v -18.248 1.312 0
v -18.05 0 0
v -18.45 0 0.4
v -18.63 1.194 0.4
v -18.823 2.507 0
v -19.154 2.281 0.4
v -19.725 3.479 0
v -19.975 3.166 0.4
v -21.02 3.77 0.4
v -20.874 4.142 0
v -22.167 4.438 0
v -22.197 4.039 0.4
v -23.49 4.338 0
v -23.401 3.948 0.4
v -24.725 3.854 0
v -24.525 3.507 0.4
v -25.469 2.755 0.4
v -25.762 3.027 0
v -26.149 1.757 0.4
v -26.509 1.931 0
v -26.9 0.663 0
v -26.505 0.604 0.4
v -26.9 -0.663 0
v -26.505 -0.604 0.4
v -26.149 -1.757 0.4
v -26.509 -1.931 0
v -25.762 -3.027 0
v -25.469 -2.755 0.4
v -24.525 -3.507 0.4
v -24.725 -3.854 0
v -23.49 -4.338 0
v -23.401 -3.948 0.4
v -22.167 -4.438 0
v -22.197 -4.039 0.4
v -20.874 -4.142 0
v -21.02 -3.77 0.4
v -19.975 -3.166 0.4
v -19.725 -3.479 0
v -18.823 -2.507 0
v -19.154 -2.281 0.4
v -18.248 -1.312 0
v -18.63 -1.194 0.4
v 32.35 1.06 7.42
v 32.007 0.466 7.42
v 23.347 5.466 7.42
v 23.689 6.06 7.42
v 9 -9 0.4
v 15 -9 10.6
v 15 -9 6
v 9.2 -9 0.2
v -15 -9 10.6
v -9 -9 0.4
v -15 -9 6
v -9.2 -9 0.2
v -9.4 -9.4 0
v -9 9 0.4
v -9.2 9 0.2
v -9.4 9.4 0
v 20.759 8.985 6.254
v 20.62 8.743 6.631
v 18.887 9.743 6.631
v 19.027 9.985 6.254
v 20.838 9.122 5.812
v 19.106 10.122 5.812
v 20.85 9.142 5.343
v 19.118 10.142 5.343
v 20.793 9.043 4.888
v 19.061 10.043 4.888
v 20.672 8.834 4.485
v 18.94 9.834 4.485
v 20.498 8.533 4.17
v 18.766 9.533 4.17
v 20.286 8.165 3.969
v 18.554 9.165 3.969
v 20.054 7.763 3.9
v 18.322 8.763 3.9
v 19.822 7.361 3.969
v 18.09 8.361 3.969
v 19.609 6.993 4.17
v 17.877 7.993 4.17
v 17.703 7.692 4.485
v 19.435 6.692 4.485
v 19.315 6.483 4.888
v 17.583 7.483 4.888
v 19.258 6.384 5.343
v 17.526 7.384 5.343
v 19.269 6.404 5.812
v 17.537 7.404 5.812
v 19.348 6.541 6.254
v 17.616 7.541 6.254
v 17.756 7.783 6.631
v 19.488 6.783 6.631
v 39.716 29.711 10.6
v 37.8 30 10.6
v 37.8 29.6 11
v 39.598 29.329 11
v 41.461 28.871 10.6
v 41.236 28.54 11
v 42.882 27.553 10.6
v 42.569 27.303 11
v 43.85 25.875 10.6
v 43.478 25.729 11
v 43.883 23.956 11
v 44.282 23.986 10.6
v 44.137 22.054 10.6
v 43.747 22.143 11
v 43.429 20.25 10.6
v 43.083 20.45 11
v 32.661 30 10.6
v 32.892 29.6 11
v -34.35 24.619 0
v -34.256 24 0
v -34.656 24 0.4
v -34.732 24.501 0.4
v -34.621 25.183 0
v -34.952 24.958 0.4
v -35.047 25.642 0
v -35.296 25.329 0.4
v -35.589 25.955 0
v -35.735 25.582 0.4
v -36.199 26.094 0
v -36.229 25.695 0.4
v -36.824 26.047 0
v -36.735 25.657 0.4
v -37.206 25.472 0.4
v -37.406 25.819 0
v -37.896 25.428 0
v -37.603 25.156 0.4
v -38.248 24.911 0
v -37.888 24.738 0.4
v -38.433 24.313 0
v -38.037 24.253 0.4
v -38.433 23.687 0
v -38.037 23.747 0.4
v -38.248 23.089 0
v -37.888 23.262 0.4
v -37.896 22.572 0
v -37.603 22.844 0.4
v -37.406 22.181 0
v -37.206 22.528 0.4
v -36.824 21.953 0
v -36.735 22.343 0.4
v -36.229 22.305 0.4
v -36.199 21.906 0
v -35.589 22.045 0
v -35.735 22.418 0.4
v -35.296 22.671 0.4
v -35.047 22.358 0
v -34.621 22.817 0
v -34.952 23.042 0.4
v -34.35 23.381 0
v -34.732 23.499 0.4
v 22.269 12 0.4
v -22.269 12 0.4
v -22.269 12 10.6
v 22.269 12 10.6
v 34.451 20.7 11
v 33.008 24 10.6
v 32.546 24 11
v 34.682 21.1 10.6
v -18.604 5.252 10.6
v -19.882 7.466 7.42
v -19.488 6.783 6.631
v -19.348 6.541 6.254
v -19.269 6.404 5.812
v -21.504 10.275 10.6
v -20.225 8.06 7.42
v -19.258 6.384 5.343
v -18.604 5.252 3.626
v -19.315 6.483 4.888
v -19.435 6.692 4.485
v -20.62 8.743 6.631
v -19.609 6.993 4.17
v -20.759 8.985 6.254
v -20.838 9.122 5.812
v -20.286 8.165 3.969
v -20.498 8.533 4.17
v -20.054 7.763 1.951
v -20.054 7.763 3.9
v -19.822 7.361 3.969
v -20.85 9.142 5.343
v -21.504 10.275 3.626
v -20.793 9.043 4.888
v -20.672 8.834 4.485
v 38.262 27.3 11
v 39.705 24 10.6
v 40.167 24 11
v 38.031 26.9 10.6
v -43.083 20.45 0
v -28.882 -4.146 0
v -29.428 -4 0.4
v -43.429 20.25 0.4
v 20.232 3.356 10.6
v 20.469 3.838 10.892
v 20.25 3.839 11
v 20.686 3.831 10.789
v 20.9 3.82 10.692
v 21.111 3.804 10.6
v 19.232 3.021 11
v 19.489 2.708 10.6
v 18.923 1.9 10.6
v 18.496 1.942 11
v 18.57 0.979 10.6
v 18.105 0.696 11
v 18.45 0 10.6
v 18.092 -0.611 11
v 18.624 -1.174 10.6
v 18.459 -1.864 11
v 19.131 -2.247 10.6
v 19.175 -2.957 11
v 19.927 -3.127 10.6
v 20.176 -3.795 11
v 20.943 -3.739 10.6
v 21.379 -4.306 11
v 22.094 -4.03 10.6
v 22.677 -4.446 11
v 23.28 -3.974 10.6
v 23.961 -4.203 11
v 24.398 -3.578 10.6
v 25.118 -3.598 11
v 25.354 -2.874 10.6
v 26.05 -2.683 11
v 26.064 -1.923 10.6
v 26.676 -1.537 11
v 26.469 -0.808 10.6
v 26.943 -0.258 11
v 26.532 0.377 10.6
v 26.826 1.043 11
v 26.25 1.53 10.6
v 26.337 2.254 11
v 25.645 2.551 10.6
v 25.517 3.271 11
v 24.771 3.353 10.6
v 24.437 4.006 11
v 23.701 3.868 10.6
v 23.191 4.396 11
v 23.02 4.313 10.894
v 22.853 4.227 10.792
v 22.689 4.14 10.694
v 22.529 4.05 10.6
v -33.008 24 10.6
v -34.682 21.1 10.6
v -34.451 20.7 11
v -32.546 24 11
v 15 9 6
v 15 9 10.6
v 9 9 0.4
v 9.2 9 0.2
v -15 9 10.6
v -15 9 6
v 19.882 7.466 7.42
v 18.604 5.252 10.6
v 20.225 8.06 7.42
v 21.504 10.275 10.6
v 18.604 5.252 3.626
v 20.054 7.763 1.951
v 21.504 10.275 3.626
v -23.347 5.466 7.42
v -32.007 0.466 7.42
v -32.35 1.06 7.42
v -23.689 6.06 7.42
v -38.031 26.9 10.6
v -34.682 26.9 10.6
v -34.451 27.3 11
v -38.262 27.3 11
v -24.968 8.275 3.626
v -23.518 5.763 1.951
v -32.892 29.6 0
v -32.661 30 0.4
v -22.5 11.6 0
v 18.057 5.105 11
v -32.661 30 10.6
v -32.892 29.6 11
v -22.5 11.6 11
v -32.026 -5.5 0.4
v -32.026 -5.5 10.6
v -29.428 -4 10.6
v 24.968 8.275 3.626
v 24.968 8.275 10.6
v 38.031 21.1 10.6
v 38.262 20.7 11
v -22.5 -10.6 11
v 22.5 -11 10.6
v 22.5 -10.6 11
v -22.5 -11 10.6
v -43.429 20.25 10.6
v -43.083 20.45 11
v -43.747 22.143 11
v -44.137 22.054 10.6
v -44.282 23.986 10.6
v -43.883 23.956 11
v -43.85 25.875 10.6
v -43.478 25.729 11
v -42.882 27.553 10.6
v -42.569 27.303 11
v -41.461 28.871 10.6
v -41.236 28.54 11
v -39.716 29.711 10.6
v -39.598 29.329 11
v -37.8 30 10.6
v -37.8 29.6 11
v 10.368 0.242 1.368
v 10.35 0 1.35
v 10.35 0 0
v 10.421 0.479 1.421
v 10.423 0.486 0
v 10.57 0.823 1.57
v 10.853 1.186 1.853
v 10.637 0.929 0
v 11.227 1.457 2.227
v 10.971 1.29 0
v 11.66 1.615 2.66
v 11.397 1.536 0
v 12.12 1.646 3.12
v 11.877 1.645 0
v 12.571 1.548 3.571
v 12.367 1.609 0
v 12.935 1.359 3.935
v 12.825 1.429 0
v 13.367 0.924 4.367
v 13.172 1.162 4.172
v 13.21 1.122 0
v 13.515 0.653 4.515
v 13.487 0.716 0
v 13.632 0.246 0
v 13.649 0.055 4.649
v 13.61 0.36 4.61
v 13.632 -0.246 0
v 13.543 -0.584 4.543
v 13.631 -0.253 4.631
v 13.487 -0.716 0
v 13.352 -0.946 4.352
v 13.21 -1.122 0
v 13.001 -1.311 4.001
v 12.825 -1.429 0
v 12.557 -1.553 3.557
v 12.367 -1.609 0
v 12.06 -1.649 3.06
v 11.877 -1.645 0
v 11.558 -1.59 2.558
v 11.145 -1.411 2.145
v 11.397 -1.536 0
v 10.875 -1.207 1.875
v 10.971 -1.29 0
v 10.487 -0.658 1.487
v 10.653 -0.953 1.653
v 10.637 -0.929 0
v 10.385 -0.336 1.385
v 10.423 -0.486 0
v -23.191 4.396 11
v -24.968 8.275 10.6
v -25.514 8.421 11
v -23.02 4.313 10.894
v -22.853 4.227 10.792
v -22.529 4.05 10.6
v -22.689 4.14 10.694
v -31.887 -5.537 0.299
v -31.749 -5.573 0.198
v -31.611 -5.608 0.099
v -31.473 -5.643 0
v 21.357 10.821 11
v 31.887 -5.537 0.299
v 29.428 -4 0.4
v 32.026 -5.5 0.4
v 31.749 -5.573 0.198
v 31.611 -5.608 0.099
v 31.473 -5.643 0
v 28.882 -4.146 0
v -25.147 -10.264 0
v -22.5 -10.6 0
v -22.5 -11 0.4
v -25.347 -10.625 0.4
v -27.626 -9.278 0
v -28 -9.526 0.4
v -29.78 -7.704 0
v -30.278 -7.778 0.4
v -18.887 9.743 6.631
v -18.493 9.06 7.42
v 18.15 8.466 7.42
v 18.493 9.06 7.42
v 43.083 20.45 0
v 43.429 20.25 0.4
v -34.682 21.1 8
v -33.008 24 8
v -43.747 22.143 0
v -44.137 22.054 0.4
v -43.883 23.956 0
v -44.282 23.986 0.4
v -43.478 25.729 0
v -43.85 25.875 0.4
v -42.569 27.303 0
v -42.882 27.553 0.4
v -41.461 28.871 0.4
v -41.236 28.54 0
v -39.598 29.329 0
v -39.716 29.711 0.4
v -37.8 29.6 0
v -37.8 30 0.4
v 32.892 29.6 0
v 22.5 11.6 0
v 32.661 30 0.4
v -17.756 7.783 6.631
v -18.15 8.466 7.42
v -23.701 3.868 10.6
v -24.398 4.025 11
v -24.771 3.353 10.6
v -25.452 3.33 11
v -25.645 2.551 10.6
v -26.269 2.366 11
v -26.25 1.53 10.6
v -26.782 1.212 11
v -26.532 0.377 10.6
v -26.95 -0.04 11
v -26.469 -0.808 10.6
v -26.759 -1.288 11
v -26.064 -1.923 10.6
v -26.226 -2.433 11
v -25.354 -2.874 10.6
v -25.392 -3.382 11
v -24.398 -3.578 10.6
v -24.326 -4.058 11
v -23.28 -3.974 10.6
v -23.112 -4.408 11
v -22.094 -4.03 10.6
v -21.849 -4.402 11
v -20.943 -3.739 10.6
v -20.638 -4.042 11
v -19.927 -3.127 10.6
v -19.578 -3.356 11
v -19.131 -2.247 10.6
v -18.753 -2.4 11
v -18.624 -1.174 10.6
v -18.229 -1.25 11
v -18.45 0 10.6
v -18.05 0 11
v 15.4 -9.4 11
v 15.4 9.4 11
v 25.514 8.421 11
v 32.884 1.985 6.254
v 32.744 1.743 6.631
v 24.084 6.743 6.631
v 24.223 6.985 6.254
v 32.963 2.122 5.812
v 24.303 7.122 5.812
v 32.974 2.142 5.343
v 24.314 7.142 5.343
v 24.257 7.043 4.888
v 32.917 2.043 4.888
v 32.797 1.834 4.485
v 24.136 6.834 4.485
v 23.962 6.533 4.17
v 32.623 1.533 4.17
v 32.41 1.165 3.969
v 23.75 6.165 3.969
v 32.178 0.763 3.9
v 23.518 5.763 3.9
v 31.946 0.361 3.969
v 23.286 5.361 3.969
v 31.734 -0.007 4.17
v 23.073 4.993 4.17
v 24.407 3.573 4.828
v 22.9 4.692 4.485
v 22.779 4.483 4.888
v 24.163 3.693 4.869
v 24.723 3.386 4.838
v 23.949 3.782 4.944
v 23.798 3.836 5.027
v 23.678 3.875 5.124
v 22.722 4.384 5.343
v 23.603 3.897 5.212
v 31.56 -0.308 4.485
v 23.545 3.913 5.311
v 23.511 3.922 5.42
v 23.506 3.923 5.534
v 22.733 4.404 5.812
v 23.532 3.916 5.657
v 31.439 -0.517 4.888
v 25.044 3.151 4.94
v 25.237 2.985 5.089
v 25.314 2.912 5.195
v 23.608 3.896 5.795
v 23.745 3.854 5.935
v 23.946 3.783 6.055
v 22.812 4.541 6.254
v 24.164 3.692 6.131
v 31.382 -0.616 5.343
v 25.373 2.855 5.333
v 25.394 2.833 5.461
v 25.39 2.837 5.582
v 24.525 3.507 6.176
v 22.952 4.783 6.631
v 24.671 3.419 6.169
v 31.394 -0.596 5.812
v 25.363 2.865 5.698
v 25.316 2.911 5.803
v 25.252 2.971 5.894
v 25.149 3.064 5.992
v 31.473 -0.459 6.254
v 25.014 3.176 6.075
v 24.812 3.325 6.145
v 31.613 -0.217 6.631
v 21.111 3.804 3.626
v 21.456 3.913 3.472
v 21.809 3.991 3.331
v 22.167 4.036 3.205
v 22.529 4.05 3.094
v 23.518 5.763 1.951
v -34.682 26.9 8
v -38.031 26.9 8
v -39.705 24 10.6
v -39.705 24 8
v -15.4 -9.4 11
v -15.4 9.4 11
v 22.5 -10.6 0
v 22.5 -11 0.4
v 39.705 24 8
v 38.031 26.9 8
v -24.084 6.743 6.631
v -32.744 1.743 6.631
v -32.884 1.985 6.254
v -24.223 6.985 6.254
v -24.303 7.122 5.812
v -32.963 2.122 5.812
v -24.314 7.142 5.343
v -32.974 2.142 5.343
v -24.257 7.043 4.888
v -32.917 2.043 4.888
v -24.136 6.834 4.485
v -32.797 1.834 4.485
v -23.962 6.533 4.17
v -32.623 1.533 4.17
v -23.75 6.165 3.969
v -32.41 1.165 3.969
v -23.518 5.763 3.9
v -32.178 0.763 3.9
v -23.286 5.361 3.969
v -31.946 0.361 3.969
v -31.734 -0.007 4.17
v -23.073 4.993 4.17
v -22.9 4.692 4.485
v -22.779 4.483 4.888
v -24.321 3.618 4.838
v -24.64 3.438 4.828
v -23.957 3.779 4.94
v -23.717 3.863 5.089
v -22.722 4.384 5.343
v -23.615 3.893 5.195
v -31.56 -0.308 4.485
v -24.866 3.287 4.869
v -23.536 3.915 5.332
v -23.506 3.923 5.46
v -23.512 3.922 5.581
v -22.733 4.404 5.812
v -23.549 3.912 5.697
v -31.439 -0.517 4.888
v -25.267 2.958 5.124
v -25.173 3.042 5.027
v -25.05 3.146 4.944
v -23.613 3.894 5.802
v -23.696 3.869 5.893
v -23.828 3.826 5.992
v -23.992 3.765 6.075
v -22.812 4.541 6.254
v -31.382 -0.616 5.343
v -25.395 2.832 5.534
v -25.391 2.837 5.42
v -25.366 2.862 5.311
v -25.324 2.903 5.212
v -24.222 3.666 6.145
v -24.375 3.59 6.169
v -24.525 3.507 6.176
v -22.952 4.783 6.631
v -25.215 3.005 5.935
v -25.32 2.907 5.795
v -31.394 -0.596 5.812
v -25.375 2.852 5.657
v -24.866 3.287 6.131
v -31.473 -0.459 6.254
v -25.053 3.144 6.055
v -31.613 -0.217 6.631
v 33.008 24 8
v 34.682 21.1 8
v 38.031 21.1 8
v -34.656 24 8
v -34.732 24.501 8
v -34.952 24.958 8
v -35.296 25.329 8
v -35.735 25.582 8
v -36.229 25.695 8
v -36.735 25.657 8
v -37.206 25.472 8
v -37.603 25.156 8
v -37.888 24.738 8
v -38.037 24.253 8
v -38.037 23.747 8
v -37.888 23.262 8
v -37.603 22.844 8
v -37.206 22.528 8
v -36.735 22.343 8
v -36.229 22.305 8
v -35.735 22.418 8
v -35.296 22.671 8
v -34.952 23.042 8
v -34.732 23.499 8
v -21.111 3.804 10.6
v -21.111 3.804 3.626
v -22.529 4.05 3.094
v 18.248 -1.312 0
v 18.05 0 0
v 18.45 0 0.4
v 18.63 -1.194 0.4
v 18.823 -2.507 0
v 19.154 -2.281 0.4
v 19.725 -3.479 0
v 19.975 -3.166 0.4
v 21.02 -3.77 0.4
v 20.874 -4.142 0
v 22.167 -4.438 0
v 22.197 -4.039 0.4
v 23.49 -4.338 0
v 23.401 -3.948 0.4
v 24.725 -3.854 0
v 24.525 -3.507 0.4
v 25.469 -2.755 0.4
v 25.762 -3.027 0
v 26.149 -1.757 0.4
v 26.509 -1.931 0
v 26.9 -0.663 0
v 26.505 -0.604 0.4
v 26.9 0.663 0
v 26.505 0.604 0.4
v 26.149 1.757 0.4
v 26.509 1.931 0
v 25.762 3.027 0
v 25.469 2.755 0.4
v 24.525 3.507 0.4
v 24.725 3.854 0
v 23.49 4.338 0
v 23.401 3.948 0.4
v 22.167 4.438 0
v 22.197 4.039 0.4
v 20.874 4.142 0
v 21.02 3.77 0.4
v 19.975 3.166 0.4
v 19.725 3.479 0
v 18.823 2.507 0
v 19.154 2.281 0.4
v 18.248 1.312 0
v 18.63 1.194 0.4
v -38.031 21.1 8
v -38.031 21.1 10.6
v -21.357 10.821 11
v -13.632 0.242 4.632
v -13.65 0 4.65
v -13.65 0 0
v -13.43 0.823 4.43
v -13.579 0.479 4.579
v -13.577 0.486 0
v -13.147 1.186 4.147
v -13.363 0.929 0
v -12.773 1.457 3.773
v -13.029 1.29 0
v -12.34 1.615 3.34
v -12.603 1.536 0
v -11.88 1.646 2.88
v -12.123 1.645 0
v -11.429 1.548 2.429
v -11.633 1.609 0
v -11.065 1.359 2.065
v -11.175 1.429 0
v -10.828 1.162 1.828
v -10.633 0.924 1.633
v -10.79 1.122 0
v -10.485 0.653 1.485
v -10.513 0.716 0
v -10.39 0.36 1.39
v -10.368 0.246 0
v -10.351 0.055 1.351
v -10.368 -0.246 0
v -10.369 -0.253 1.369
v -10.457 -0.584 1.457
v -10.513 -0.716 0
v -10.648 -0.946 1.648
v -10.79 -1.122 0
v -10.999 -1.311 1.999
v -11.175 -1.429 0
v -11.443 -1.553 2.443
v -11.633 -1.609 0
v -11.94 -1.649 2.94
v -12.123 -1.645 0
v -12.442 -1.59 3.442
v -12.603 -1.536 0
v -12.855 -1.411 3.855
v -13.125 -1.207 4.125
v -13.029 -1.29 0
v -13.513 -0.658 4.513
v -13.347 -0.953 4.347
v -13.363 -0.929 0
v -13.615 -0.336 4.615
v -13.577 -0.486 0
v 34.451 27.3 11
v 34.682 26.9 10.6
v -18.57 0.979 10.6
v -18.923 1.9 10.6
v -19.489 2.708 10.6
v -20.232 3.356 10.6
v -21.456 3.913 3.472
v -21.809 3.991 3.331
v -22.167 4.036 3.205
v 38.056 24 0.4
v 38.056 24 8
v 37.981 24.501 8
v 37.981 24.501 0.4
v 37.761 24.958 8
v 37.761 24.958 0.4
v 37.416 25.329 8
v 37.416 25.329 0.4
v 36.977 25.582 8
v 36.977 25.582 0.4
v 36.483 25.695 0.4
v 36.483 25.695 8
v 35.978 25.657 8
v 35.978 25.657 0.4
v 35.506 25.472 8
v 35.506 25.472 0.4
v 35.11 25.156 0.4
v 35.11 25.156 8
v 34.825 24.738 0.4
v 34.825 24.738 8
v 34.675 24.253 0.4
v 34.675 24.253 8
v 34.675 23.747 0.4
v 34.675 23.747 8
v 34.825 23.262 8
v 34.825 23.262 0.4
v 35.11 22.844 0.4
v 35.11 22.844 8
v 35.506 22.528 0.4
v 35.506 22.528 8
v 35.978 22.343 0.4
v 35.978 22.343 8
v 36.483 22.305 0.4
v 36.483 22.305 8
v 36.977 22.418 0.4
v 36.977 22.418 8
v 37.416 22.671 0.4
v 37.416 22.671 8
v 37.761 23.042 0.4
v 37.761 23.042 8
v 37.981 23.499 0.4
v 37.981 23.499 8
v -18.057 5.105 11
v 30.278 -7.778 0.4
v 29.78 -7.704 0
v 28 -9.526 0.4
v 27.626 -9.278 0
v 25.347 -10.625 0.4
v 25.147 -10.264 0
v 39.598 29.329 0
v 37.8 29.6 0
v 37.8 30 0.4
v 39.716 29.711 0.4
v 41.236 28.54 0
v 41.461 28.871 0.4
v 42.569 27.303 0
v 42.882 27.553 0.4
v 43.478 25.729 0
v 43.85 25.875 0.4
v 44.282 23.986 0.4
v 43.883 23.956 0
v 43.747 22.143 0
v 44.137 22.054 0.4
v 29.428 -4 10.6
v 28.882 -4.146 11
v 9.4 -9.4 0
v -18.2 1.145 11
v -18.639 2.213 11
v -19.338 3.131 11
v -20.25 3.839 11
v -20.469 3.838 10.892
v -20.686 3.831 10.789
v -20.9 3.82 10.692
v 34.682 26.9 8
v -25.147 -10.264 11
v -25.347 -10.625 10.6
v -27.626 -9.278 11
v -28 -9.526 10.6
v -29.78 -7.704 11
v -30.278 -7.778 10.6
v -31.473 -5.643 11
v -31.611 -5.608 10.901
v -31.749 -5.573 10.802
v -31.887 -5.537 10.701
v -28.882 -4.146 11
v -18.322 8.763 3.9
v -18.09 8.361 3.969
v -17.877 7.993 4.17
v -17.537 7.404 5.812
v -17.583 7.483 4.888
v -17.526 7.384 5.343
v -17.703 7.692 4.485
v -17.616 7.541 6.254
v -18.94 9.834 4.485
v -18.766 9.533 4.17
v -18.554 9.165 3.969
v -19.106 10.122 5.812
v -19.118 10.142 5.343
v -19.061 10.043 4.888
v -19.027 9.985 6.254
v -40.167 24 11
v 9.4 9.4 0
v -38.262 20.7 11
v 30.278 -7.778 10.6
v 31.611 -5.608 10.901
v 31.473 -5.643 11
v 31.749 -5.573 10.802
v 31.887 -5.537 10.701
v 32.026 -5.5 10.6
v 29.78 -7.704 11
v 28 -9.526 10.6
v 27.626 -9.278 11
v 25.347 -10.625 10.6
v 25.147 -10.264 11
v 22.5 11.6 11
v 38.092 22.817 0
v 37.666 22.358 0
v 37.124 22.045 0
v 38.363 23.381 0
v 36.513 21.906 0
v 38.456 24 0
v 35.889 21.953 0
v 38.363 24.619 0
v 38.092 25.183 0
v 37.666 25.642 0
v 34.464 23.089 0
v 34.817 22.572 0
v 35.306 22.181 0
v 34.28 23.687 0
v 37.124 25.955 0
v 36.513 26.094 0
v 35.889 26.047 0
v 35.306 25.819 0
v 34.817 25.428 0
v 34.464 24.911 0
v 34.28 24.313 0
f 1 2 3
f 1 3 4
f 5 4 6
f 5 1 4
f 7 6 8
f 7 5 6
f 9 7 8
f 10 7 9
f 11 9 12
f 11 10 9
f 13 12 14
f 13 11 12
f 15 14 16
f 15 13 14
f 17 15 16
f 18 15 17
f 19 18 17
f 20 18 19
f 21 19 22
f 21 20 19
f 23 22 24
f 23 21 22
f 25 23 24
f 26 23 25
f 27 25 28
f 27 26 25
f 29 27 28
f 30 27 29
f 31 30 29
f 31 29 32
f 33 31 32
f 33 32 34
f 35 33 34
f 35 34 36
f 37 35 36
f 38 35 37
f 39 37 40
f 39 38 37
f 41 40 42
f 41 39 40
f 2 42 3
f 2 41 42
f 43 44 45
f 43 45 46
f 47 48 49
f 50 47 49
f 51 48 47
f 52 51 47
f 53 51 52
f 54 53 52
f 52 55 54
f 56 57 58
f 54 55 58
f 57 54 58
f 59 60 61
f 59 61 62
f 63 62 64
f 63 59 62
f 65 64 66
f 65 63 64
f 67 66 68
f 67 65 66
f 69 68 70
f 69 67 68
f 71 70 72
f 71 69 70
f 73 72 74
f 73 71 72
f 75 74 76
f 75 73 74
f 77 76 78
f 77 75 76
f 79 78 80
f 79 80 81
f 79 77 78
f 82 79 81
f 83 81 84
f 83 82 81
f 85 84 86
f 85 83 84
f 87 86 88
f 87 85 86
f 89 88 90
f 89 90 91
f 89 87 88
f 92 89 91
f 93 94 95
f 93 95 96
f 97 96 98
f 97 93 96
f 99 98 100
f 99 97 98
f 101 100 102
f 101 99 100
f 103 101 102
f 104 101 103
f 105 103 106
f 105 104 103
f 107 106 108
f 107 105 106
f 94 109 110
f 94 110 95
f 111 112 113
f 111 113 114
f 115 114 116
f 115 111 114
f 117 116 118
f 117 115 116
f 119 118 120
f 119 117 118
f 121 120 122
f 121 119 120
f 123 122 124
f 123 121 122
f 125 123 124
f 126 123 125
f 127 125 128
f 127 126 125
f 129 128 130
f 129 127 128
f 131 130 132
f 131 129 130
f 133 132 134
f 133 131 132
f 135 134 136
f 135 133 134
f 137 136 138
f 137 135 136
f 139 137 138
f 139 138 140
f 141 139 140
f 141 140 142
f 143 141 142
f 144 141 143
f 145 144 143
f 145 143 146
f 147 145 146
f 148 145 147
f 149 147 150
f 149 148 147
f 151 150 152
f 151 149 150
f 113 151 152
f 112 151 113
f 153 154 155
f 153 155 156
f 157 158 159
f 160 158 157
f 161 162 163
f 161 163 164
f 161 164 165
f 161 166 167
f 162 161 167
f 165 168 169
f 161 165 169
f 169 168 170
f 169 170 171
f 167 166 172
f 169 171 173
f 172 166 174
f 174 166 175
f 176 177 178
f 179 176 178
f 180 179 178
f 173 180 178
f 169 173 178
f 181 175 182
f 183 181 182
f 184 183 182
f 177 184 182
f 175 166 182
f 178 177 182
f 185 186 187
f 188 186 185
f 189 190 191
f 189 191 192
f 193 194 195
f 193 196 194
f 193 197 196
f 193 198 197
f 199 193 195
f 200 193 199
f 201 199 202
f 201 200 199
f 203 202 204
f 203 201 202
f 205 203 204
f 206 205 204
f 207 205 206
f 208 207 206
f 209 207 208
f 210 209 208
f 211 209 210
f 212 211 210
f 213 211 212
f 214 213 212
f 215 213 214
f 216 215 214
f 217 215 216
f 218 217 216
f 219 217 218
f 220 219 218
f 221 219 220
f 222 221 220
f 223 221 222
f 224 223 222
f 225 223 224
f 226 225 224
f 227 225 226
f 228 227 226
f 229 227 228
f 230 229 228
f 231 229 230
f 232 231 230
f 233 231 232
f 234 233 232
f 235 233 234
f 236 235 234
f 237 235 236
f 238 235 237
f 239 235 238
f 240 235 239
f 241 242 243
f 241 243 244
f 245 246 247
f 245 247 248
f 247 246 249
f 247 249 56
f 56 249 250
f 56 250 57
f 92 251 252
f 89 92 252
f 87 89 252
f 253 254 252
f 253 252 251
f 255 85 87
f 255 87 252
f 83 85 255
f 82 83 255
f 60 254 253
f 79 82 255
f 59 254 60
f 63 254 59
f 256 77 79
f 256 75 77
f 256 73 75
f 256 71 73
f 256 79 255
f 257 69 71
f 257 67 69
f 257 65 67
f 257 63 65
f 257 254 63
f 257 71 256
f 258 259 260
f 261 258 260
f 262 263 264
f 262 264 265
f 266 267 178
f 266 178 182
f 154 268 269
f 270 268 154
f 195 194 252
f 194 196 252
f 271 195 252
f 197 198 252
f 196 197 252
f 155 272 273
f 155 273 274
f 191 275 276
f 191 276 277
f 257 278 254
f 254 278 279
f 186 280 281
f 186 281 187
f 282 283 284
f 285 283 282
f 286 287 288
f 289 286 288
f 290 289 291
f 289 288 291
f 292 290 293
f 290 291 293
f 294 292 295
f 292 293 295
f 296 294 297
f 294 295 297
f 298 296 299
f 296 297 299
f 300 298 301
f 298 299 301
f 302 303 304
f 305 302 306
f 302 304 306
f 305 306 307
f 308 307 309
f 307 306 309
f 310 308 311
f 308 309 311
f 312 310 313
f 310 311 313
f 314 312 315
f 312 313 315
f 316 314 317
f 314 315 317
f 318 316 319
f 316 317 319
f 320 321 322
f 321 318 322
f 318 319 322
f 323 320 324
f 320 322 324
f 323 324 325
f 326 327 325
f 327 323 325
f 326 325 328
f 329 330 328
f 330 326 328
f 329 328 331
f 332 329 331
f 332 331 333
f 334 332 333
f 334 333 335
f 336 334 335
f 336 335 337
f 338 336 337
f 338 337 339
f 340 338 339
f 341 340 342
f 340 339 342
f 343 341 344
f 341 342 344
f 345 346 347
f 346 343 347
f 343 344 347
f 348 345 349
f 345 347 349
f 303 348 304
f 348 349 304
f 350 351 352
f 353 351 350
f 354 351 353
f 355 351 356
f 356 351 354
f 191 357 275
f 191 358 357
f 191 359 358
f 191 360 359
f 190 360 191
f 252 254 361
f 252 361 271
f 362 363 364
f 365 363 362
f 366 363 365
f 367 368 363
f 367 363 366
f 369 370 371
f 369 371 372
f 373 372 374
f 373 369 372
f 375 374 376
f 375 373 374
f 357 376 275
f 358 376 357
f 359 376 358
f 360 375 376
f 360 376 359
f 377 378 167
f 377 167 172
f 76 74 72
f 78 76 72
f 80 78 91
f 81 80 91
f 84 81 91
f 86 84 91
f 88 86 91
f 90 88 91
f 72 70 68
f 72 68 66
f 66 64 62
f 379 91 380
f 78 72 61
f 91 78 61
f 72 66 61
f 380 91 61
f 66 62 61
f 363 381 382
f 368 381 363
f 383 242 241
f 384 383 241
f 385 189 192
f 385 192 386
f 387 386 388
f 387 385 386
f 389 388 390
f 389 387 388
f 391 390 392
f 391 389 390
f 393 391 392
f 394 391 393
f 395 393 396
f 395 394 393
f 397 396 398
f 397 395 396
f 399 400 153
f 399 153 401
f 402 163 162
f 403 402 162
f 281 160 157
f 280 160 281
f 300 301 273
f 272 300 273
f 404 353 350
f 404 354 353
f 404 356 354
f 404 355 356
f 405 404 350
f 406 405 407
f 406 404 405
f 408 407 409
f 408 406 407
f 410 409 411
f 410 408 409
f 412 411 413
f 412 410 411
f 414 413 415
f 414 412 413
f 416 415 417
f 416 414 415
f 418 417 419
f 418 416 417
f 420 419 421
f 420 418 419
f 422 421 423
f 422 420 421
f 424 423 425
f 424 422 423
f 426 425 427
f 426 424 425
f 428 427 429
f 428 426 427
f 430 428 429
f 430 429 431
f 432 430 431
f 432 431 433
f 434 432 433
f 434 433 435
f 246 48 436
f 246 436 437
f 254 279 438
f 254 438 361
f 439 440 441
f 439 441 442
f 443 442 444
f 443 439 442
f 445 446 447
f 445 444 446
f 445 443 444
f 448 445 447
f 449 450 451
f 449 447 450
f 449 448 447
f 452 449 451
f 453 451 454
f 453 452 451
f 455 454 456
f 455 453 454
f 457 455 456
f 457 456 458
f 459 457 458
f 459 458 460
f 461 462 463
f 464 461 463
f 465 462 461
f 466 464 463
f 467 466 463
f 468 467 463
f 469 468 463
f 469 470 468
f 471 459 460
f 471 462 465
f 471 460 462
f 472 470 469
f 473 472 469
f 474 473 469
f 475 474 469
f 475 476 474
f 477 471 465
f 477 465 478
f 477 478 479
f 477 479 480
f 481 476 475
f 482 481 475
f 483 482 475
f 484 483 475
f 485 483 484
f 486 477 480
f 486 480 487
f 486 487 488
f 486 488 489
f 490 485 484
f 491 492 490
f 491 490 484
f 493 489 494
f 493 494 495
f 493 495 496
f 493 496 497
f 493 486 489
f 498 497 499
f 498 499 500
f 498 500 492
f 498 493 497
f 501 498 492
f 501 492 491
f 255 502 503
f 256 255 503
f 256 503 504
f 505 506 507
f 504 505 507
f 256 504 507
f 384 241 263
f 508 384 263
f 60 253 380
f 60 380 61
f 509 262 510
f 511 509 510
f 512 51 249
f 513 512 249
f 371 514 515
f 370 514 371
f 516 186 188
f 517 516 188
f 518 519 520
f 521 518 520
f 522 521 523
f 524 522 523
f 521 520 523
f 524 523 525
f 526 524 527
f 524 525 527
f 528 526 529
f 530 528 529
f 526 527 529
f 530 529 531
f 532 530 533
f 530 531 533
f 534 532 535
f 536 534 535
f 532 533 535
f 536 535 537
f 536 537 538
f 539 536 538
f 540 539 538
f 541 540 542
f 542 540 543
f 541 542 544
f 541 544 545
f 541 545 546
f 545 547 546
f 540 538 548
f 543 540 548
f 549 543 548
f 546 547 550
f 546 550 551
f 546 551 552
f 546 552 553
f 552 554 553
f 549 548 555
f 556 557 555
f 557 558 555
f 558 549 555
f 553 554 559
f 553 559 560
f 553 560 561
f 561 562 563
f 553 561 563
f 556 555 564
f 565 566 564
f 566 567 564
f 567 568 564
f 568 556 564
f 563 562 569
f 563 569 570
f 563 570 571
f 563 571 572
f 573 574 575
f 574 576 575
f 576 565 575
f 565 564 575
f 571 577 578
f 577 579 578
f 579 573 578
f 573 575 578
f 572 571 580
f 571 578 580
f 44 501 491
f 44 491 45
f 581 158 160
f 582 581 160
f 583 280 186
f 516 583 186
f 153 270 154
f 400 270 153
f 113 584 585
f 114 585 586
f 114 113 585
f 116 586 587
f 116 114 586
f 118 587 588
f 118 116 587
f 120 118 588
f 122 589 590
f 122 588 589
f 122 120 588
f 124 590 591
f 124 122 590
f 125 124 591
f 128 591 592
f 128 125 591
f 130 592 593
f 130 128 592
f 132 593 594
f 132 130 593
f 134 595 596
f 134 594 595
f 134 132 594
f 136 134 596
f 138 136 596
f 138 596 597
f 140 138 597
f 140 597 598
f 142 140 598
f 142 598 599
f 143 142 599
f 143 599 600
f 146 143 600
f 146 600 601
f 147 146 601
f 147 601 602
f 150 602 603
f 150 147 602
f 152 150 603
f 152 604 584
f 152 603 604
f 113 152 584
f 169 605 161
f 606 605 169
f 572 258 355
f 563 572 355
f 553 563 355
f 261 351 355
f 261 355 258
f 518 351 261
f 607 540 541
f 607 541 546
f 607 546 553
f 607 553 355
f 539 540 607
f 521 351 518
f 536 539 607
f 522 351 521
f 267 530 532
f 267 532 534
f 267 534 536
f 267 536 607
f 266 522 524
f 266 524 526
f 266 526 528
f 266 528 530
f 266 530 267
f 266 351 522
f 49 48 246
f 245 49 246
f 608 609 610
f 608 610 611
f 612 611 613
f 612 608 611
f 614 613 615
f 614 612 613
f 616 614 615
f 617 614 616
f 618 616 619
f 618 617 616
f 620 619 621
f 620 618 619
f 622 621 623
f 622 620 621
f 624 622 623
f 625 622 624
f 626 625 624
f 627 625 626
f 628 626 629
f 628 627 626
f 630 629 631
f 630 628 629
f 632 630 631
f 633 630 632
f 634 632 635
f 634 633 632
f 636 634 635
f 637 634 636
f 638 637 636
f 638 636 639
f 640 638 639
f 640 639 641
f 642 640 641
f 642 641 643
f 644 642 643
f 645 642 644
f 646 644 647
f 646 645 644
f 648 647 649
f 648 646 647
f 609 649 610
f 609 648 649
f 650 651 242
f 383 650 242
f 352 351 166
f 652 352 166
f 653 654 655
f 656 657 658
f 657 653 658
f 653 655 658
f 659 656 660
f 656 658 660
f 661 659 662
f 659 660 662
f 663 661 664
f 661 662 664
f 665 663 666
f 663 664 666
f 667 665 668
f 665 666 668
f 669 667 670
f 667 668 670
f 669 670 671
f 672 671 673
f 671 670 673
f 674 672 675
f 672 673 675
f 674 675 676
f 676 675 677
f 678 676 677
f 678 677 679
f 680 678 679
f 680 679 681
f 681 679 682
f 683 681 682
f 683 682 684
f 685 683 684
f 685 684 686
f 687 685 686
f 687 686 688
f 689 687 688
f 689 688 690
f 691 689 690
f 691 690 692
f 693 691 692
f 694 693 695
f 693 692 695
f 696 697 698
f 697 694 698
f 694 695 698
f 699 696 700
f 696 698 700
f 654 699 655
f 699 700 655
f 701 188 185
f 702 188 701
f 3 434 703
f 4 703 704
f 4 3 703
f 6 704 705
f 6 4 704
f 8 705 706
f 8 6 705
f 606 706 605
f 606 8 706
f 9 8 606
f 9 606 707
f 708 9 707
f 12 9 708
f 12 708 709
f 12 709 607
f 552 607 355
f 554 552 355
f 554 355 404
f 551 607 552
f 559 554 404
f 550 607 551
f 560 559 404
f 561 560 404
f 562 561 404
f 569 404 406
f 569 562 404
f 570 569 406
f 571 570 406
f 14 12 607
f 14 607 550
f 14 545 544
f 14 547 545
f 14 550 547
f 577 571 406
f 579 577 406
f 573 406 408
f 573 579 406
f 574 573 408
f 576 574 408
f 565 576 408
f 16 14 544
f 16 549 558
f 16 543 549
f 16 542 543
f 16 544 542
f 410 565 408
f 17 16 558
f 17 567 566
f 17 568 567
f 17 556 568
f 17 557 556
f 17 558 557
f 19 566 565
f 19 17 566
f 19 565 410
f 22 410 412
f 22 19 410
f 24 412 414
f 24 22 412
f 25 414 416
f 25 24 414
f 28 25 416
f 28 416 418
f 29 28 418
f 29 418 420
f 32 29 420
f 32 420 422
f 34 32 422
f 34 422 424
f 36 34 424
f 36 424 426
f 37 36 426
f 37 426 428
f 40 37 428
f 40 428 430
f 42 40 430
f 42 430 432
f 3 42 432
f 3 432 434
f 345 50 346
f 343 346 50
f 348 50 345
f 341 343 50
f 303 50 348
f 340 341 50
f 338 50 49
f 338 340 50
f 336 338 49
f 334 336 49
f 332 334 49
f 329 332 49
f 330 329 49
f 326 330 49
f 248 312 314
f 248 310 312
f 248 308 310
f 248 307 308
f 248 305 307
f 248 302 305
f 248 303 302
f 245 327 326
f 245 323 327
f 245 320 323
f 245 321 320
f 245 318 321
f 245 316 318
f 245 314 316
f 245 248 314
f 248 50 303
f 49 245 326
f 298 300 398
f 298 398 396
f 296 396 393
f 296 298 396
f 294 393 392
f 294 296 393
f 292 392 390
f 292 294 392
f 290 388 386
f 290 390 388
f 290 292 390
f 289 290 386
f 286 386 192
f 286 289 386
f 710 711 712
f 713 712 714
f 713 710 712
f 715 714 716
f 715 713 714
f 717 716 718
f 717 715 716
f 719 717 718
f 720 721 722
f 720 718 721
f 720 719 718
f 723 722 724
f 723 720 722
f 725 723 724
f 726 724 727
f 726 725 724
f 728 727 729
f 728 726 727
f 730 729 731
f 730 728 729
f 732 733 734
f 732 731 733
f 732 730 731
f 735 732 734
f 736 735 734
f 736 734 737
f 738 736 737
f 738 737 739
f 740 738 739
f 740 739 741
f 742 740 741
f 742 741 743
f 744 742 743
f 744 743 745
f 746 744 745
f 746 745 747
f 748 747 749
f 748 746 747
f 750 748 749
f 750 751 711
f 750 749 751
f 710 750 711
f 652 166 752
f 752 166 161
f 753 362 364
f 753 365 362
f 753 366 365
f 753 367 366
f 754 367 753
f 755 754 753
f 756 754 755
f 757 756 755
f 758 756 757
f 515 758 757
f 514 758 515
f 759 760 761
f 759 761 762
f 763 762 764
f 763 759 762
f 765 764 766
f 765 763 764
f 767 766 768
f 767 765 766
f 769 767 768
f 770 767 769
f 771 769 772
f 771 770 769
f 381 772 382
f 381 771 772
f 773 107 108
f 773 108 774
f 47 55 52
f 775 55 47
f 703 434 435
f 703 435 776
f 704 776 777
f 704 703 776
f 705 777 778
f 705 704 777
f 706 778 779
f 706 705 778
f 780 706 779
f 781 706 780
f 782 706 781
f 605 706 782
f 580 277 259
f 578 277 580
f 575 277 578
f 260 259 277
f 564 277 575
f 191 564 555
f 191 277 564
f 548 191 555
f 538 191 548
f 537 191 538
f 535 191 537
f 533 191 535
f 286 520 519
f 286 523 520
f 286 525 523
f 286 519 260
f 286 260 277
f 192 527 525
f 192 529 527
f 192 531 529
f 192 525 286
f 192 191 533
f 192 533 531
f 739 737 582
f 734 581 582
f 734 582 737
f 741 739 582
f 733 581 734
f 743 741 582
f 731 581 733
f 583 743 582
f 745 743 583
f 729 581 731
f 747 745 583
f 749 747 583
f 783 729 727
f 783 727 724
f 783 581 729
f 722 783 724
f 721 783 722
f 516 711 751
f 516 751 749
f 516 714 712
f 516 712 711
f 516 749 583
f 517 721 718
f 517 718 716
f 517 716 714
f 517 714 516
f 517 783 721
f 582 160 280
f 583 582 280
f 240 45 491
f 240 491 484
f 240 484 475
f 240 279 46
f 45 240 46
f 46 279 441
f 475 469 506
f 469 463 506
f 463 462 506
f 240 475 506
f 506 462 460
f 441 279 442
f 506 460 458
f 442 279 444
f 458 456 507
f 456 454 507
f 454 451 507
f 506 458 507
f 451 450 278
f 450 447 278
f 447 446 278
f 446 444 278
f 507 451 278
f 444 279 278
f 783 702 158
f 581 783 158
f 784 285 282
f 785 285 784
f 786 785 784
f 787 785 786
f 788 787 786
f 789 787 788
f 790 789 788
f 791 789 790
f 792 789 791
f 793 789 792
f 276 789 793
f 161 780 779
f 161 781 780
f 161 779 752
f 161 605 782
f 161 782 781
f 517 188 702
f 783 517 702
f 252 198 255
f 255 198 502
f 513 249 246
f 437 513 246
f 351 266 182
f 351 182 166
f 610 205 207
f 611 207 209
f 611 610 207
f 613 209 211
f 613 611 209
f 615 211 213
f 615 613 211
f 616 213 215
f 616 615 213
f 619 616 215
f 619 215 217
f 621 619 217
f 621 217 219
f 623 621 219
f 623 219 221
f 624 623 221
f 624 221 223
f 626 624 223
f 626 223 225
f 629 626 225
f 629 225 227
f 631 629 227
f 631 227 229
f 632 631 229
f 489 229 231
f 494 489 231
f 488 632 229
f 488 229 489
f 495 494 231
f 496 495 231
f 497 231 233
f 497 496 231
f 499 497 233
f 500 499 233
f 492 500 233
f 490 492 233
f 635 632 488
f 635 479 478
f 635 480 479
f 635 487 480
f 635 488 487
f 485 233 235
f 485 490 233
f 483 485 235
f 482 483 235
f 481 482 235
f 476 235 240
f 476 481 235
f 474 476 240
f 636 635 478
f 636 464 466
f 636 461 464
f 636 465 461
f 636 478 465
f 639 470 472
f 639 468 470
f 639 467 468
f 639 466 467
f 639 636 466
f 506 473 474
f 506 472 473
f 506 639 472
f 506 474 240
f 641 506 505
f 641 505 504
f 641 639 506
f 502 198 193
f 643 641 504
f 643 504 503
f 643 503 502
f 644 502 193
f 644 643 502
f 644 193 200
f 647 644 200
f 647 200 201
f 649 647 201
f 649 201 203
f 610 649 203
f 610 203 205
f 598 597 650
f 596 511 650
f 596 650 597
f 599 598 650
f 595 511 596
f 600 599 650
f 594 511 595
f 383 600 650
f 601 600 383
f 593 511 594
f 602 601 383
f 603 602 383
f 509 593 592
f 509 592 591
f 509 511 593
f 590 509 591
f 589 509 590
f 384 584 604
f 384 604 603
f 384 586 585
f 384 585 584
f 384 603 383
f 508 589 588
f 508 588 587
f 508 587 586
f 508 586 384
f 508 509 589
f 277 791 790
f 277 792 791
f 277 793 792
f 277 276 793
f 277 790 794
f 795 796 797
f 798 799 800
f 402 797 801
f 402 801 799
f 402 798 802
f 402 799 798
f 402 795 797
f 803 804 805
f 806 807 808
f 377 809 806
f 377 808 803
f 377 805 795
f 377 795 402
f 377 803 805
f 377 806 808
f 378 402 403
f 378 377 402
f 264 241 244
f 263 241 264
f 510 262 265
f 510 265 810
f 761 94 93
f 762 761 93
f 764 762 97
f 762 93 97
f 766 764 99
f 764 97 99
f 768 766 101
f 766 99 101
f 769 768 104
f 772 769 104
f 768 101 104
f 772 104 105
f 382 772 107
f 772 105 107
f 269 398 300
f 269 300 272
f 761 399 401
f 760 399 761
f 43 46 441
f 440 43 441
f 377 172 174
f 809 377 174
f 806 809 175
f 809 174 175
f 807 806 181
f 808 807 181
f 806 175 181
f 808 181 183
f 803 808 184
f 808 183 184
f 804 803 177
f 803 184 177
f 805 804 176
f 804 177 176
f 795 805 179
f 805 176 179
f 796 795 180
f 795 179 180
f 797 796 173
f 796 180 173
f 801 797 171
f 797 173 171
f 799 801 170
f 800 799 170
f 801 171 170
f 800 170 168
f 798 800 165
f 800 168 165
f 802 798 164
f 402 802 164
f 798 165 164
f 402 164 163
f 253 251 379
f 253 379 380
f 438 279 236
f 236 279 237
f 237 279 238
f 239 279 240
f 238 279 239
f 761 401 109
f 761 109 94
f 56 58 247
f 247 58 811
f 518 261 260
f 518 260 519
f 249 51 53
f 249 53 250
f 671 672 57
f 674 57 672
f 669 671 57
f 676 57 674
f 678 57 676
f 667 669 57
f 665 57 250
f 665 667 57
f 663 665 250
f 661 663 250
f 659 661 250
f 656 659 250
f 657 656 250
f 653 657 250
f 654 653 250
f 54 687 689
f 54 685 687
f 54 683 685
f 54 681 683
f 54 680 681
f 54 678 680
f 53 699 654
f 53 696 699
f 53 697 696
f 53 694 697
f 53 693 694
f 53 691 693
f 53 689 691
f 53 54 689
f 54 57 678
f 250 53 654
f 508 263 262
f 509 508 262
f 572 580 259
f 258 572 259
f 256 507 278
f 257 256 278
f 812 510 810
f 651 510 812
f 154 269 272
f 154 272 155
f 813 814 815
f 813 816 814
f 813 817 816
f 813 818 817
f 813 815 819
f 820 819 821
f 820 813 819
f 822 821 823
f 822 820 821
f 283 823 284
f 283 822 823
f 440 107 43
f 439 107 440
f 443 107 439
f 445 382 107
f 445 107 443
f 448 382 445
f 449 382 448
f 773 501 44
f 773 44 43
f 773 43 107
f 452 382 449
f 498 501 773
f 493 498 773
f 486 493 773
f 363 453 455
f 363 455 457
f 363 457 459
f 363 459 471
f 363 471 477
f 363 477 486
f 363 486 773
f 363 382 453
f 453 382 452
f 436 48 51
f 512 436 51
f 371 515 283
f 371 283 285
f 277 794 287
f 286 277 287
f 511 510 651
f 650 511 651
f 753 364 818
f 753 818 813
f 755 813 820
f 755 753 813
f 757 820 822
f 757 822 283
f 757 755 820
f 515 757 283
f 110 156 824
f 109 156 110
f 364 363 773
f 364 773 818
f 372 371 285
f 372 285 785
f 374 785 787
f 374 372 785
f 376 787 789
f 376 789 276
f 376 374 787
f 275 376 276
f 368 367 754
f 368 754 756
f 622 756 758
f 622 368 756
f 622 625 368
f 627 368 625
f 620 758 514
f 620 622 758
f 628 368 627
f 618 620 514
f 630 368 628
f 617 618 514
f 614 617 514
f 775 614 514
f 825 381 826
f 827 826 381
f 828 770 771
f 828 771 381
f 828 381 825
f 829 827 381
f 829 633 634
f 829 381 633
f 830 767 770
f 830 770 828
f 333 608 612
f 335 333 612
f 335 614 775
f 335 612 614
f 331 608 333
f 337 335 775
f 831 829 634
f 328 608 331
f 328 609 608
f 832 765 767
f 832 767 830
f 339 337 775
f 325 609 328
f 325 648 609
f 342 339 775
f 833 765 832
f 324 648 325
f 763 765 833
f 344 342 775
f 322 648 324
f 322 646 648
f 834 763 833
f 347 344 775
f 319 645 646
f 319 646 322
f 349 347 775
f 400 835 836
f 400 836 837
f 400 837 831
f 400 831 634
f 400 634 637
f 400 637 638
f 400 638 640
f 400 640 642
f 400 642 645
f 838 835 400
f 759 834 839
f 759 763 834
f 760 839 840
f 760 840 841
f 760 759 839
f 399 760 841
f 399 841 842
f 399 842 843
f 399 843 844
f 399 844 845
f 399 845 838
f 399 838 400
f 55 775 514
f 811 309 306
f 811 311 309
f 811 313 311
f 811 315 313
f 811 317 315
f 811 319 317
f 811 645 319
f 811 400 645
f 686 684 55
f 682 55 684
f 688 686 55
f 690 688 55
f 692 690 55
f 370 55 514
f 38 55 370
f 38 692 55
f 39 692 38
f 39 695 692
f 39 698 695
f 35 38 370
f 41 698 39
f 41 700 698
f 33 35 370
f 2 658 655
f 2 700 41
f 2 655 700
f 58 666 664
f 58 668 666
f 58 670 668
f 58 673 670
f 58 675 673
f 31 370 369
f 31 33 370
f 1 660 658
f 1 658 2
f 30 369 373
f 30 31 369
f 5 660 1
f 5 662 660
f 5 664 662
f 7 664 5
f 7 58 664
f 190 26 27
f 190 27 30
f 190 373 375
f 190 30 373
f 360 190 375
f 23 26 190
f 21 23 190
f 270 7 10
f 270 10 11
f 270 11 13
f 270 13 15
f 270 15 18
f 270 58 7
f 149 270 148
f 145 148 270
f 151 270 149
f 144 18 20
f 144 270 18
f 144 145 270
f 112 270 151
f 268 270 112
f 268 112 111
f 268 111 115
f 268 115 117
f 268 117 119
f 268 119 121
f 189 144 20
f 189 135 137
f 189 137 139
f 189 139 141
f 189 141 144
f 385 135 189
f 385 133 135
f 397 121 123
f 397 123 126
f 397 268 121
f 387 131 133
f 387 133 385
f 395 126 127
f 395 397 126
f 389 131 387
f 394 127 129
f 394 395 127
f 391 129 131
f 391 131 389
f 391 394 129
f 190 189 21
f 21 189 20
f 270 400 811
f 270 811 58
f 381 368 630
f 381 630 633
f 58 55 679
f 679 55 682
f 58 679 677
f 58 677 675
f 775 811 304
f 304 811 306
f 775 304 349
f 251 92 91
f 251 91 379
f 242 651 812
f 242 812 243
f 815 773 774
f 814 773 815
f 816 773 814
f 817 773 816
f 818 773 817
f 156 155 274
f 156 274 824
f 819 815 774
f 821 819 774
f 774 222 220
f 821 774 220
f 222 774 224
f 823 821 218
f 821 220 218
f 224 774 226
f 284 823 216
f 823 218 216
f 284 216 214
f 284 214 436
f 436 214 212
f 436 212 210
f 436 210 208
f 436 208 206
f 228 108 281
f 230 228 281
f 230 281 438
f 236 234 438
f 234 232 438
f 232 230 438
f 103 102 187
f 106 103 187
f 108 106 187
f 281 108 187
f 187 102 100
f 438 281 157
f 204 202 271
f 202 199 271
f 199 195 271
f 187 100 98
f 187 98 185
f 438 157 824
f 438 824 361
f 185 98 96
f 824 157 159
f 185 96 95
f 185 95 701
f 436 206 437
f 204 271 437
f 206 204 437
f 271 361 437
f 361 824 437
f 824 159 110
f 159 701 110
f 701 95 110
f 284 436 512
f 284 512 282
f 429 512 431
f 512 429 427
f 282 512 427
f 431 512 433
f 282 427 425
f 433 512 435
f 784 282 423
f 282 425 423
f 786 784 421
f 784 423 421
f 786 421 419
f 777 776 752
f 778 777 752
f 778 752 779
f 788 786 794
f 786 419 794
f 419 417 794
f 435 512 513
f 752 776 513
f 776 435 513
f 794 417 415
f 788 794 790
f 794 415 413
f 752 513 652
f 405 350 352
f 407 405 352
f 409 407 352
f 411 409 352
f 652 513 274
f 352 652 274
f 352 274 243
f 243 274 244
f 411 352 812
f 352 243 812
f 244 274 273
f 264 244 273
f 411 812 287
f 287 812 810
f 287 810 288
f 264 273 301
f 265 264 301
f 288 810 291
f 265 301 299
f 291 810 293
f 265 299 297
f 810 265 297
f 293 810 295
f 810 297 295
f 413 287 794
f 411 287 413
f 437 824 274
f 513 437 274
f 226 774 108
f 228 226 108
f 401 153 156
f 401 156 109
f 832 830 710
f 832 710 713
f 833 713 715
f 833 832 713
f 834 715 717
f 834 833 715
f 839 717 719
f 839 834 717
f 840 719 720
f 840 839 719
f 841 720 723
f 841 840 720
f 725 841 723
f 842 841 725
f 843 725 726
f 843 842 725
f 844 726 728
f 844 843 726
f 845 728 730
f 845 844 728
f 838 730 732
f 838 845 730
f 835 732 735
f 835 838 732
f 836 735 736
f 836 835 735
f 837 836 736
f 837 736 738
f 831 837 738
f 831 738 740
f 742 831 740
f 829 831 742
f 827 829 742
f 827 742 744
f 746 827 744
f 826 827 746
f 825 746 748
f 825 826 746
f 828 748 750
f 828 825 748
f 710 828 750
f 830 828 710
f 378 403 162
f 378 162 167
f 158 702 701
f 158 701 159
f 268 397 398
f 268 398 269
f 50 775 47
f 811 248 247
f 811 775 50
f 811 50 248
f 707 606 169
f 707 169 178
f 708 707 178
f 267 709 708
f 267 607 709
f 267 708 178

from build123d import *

# Parameters (mm, degrees)
SKETCH1_R           = 4.05
SKETCH1_R_2         = 1.7
SKETCH1_W           = 18
SKETCH1_H           = 18
BOSS_EXTRUDE1_DEPTH = 11
SKETCH11_W          = 30
SKETCH11_H          = 18
CUT_EXTRUDE9_DEPTH  = 5
CUT_EXTRUDE4_DEPTH  = 16
CUT_EXTRUDE5_START  = -10
CUT_EXTRUDE5_DEPTH  = 4
CUT_EXTRUDE7_DEPTH  = 57.773728613
CUT_EXTRUDE8_DEPTH  = 3
CHAMFER1_SIZE       = 0.4
CHAMFER2_SIZE       = 0.4
CHAMFER3_SIZE       = 6
SKETCH12_R          = 1.65
CUT_EXTRUDE10_DEPTH = 55.621156131


with BuildPart() as part:
    # Sketch1 → Boss-Extrude1 (new body)
    with BuildSketch(Plane.XY):
        with BuildLine():
            Line((-29.42820323, -4), (-46.92820323, 26.310889132))
            Line((-46.92820323, 26.310889132), (-40.538475773, 30))
            Line((-40.538475773, 30), (-32.661364738, 30))
            Line((-32.661364738, 30), (-22.269059892, 12))
            Line((-22.269059892, 12), (22.269059892, 12))
            Line((22.269059892, 12), (32.661364738, 30))
            Line((32.661364738, 30), (40.538475773, 30))
            Line((40.538475773, 30), (46.92820323, 26.310889132))
            Line((46.92820323, 26.310889132), (29.42820323, -4))
            Line((29.42820323, -4), (32.026279442, -5.5))
            ThreePointArc((32.026279442, -5.5), (28, -9.526279442), (22.5, -11))
            Line((22.5, -11), (-22.5, -11))
            ThreePointArc((-22.5, -11), (-28, -9.526279442), (-32.026279442, -5.5))
            Line((-32.026279442, -5.5), (-29.42820323, -4))
        make_face()
        with Locations((-22.5, 0)):
            Circle(SKETCH1_R, mode=Mode.SUBTRACT)
        with Locations(Location((22.5, 0, 0), (0, 0, 180))):
            Circle(SKETCH1_R, mode=Mode.SUBTRACT)
        with Locations((-36.356406461, 24)):
            Circle(SKETCH1_R_2, mode=Mode.SUBTRACT)
        with Locations((36.356406461, 24)):
            Circle(SKETCH1_R_2, mode=Mode.SUBTRACT)
        Rectangle(SKETCH1_W, SKETCH1_H, mode=Mode.SUBTRACT)
    extrude(amount=BOSS_EXTRUDE1_DEPTH)

    # Sketch11 → Cut-Extrude9 (cut)
    with BuildSketch(Plane.XY.offset(11)):
        Rectangle(SKETCH11_W, SKETCH11_H)
    extrude(amount=-CUT_EXTRUDE9_DEPTH, mode=Mode.SUBTRACT)

    # Sketch6 → Cut-Extrude4 (cut)
    with BuildSketch(Plane(origin=(-23.80320323, -13.742785793, 0), x_dir=(0, 0, 1), z_dir=(-0.8660254037844398, -0.4999999999999983, 0))):
        with BuildLine():
            Line((6.63137085, 15.61862915), (7.42, 16.4072583))
            Line((7.42, 16.4072583), (7.42, 17.0927417))
            Line((7.42, 17.0927417), (6.63137085, 17.88137085))
            ThreePointArc((6.63137085, 17.88137085), (3.9, 16.75), (6.63137085, 15.61862915))
        make_face()
    cut_extrude4 = extrude(amount=-CUT_EXTRUDE4_DEPTH, mode=Mode.SUBTRACT)

    # Sketch7 → Cut-Extrude5 (cut)
    with BuildSketch(Plane(origin=(-23.80320323, -13.742785793, 0), x_dir=(0, 0, 1), z_dir=(-0.8660254037844398, -0.4999999999999983, 0)).offset(CUT_EXTRUDE5_START)):
        Polygon((11, 19.65), (11, 13.85), (3.625684219, 13.85), (1.951368439, 16.75), (3.625684219, 19.65), align=None)
    cut_extrude5 = extrude(amount=-CUT_EXTRUDE5_DEPTH, mode=Mode.SUBTRACT)

    # Mirror2: Cut-Extrude4, Cut-Extrude5 across plane
    add(cut_extrude4.mirror(Plane(origin=(0, 0, 0), x_dir=(0, 0, 1), z_dir=(1, 0, 0))), mode=Mode.SUBTRACT)
    add(cut_extrude5.mirror(Plane(origin=(0, 0, 0), x_dir=(0, 0, 1), z_dir=(1, 0, 0))), mode=Mode.SUBTRACT)

    # Sketch9 → Cut-Extrude7 (cut, through all)
    with BuildSketch(Plane.XY.offset(11)):
        with BuildLine():
            Line((-43.428947258, 20.25), (-46.92820323, 26.310889132))
            Line((-46.92820323, 26.310889132), (-40.538475773, 30))
            Line((-40.538475773, 30), (-37.799782134, 30))
            ThreePointArc((-37.799782134, 30), (-43.428947258, 26.75), (-43.428947258, 20.25))
        make_face()
        with BuildLine():
            Line((40.538475773, 30), (37.799782134, 30))
            ThreePointArc((37.799782134, 30), (43.428947258, 26.75), (43.428947258, 20.25))
            Line((43.428947258, 20.25), (46.92820323, 26.310889132))
            Line((46.92820323, 26.310889132), (40.538475773, 30))
        make_face()
    extrude(amount=-CUT_EXTRUDE7_DEPTH, mode=Mode.SUBTRACT)

    # Sketch10 → Cut-Extrude8 (cut)
    with BuildSketch(Plane.XY.offset(11)):
        Polygon((39.705038022, 24), (38.030722241, 26.9), (34.68209068, 26.9), (33.007774899, 24), (34.68209068, 21.1), (38.030722241, 21.1), align=None)
        Polygon((-33.007774899, 24), (-34.68209068, 26.9), (-38.030722241, 26.9), (-39.705038022, 24), (-38.030722241, 21.1), (-34.68209068, 21.1), align=None)
    extrude(amount=-CUT_EXTRUDE8_DEPTH, mode=Mode.SUBTRACT)

    # Chamfer1
    chamfer1_edges = [part.edges().sort_by_distance(p)[0] for p in [
        (0, -11, 11),
        (-25.353578994, -2.873949708, 11),
        (-23.748378775, 6.162255466, 11),
        (-20.053847577, 7.763139721, 11),
        (-23.235898385, 9.274613392, 11),
        (-19.857316504, 4.527975428, 11),
        (28, -9.526279442, 11),
        (30.727241336, -4.75, 11),
        (25.353578994, -2.873949708, 11),
        (23.235898385, 9.274613392, 11),
        (19.857316504, 4.527975428, 11),
        (23.748378775, 6.162255466, 11),
        (20.053847577, 7.763139721, 11),
        (36.428575244, 8.125, 11),
        (-36.428575244, 8.125, 11),
        (-43.428947258, 26.75, 11),
        (35.230573436, 30, 11),
        (43.428947258, 26.75, 11),
        (38.867880132, 22.55, 11),
        (38.867880132, 25.45, 11),
        (36.356406461, 26.9, 11),
        (33.84493279, 25.45, 11),
        (33.84493279, 22.55, 11),
        (36.356406461, 21.1, 11),
        (-33.84493279, 22.55, 11),
        (-33.84493279, 25.45, 11),
        (-36.356406461, 26.9, 11),
        (-38.867880132, 25.45, 11),
        (-38.867880132, 22.55, 11),
        (-36.356406461, 21.1, 11),
        (27.465212315, 21, 11),
        (0, 12, 11),
        (-27.465212315, 21, 11),
        (-35.230573436, 30, 11),
        (-30.727241336, -4.75, 11),
        (0, -9, 11),
        (0, 9, 11),
        (-28, -9.526279442, 11),
        (-15, 0, 11),
        (15, 0, 11),
    ]]
    chamfer(chamfer1_edges, length=CHAMFER1_SIZE)

    # Chamfer2
    chamfer2_edges = [part.edges().sort_by_distance(p)[0] for p in [
        (-35.230573436, 30, 0),
        (-27.465212315, 21, 0),
        (0, 12, 0),
        (27.465212315, 21, 0),
        (36.428575244, 8.125, 0),
        (30.727241336, -4.75, 0),
        (28, -9.526279442, 0),
        (0, -11, 0),
        (-28, -9.526279442, 0),
        (-30.727241336, -4.75, 0),
        (-36.428575244, 8.125, 0),
        (-43.428947258, 26.75, 0),
        (35.230573436, 30, 0),
        (43.428947258, 26.75, 0),
        (-26.55, 0, 0),
        (26.55, 0, 0),
        (-9, 0, 0),
        (0, -9, 0),
        (9, 0, 0),
        (0, 9, 0),
        (-38.056406461, 24, 0),
        (34.656406461, 24, 0),
    ]]
    chamfer(chamfer2_edges, length=CHAMFER2_SIZE)

    # Chamfer3
    # the kernel refuses this chamfer: 6 mm, written as the material it takes off along each edge
    with BuildSketch(Plane(origin=(-9, -9, 6), x_dir=(0.02749587661058649, 0, -0.9996219169112968), z_dir=(0, 1, 0)), Plane(origin=(9, 9, 6), x_dir=(-0.02749587661058649, 0, -0.9996219169112968), z_dir=(0, -1, 0))) as chamfer3_piece_1:
        Polygon((CHAMFER3_SIZE * 0.999621916911, CHAMFER3_SIZE * 0.0274958766106), (-CHAMFER3_SIZE * 0.0274958766106, CHAMFER3_SIZE * 0.999621916911), (0, 0), align=None)
    extrude(amount=18, mode=Mode.SUBTRACT)

    # Sketch12 → Cut-Extrude10 (cut, through all)
    with BuildSketch(Plane(origin=(0, 0, 0), x_dir=(-1, 0, 0), z_dir=(0, 0, -1))):
        with Locations((12, 0)):
            Circle(SKETCH12_R)
        with Locations((-12, 0)):
            Circle(SKETCH12_R)
    extrude(amount=-CUT_EXTRUDE10_DEPTH, mode=Mode.SUBTRACT)


solid = part.part
